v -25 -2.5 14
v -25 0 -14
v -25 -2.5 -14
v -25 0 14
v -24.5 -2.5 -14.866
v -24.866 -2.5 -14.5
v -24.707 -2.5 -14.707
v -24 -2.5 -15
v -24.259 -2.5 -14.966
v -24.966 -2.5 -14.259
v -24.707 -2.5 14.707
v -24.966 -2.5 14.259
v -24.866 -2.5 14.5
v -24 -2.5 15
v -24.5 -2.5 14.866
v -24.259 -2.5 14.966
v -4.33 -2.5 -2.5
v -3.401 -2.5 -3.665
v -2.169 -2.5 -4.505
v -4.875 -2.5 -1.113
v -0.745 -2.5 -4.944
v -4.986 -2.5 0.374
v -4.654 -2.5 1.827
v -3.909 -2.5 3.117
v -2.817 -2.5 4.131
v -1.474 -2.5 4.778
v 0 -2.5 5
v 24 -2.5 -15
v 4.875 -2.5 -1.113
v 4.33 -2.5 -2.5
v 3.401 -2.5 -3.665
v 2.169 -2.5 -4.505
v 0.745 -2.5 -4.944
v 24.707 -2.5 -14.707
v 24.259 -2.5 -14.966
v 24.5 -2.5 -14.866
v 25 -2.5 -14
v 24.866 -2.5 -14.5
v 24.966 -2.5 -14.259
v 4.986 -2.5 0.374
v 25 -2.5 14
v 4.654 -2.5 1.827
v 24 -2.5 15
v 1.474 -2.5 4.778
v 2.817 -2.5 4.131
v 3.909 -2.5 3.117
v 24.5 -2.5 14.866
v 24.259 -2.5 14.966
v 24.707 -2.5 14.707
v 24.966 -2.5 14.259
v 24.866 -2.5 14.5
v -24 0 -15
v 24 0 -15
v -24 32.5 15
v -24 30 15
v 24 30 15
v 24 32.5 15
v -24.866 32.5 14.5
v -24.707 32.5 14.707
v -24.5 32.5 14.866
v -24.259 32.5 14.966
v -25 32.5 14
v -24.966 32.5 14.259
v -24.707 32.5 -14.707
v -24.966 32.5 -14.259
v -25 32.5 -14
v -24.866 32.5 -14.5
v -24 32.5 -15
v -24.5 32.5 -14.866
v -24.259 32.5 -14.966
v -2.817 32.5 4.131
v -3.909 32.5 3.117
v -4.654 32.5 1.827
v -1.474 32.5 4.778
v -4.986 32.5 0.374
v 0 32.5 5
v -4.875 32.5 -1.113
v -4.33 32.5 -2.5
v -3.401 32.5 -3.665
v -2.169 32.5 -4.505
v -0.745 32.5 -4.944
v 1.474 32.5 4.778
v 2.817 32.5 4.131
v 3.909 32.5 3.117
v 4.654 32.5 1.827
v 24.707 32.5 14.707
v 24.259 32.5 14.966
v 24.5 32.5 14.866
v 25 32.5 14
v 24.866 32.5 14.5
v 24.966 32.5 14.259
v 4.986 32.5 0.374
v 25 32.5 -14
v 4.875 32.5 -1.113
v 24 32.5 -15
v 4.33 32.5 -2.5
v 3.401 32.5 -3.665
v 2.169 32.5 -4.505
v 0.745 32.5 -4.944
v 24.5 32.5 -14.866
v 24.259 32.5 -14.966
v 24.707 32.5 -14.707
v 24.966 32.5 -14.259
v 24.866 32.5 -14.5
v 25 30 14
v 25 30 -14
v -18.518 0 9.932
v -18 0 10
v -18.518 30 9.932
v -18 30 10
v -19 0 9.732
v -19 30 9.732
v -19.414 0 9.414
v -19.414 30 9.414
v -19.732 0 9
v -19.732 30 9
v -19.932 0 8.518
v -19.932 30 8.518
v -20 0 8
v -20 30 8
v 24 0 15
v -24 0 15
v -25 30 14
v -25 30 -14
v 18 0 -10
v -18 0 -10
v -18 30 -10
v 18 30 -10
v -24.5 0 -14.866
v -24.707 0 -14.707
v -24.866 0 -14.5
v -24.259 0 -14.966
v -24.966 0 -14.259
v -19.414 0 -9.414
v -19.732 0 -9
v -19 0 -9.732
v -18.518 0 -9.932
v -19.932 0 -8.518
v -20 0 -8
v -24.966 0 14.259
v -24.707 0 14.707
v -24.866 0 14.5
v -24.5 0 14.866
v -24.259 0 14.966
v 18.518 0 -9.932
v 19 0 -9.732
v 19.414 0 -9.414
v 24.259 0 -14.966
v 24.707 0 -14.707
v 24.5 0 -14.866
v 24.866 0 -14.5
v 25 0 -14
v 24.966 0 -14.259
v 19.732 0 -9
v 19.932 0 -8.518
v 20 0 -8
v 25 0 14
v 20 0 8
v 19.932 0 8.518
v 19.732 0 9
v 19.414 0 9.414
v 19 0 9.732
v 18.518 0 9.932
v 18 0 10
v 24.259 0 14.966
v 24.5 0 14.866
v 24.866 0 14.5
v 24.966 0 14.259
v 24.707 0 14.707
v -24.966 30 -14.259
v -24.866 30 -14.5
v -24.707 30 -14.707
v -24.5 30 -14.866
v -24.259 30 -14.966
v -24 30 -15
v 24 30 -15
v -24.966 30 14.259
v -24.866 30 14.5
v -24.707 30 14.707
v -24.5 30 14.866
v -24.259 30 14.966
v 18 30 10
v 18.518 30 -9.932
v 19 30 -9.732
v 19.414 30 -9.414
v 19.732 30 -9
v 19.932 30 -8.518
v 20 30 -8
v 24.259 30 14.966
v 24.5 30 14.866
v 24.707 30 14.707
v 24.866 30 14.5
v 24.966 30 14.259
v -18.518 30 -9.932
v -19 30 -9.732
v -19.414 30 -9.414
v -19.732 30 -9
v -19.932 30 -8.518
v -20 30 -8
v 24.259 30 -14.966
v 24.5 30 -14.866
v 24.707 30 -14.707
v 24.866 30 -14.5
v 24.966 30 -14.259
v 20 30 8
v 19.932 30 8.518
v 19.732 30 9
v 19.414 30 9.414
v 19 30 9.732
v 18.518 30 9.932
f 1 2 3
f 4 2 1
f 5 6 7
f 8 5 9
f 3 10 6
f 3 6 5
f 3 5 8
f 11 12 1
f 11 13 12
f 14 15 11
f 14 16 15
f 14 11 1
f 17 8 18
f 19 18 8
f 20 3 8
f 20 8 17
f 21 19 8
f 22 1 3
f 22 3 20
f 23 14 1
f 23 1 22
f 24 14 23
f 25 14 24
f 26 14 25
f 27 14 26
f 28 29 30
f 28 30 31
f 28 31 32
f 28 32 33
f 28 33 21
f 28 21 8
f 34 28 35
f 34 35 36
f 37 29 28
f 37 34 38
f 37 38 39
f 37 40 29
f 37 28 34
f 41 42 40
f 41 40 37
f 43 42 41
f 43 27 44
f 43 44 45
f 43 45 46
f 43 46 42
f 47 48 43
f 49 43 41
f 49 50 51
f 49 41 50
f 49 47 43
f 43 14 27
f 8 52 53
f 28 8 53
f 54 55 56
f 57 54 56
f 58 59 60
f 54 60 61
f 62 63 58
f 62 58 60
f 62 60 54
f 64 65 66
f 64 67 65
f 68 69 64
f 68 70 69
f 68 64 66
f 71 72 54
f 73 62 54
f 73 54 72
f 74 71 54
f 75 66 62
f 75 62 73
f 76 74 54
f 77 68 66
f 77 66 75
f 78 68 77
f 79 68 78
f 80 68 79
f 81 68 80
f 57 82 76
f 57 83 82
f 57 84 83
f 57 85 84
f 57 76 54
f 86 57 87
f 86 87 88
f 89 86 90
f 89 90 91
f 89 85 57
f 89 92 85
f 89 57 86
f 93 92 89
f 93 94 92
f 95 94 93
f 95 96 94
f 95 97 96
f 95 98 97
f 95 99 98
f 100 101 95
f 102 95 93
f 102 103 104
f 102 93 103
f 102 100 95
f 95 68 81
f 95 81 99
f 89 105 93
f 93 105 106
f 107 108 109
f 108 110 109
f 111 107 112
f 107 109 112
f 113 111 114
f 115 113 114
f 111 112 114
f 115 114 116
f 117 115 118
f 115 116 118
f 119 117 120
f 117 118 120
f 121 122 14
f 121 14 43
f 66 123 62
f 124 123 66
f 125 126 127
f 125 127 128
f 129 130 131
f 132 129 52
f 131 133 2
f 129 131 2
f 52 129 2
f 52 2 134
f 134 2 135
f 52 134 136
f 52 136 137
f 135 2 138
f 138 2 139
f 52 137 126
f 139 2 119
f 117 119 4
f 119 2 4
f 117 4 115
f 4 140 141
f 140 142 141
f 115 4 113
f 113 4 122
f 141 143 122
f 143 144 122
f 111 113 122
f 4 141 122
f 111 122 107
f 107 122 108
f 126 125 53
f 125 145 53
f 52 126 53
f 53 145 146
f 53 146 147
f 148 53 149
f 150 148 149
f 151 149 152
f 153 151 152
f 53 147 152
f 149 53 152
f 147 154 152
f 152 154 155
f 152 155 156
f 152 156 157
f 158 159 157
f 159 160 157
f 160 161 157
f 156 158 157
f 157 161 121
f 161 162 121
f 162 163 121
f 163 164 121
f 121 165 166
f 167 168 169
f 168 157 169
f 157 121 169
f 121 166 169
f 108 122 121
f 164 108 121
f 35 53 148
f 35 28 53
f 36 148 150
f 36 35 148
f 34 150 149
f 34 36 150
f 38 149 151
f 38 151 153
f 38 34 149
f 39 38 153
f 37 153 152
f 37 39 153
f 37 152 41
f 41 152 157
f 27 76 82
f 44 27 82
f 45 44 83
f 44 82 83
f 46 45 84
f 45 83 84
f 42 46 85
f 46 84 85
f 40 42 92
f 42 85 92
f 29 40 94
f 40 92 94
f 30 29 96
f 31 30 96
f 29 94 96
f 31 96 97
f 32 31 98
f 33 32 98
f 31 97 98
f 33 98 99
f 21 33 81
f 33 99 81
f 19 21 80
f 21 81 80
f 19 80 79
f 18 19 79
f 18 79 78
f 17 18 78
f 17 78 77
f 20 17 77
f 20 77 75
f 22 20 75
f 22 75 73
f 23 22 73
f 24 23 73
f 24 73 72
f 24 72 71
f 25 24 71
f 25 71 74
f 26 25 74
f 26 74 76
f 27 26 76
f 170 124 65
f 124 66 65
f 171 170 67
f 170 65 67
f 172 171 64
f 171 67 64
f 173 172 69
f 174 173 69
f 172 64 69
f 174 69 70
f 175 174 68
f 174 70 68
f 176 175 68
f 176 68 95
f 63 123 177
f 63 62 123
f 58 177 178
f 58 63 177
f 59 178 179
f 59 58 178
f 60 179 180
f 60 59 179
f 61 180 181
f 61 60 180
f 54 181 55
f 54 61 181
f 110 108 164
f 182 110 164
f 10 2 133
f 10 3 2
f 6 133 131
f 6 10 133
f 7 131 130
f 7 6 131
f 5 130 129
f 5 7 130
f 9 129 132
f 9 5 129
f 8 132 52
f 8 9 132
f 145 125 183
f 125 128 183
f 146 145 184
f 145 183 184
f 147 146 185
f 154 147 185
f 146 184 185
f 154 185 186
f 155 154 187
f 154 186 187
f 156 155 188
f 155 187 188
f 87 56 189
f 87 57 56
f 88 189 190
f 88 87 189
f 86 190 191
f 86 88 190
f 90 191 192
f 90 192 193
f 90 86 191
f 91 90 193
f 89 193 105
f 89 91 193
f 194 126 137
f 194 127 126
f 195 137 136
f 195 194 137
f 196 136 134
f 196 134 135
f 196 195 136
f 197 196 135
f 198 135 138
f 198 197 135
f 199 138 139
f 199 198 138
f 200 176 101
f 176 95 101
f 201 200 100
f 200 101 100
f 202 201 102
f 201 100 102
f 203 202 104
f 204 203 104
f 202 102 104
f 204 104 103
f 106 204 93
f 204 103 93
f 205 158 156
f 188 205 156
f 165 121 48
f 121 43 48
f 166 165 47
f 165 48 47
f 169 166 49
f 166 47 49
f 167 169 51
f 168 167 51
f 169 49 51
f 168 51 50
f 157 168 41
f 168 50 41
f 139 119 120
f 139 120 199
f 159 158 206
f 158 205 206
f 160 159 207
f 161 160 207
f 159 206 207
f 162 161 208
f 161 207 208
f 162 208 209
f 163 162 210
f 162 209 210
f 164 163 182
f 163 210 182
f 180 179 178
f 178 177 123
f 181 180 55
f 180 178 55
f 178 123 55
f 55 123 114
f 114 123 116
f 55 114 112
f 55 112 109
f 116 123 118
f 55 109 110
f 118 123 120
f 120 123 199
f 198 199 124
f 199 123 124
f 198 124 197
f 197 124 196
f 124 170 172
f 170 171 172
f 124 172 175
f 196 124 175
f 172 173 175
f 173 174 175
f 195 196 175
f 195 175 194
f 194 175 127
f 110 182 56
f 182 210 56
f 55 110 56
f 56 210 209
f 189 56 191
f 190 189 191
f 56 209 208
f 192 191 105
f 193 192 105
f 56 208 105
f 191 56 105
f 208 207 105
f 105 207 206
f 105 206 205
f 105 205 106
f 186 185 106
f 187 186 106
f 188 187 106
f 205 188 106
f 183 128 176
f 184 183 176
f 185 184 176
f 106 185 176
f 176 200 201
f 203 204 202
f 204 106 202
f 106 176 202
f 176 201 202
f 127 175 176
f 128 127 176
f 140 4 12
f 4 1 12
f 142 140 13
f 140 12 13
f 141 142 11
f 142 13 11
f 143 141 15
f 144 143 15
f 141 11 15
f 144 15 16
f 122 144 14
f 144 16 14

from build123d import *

# Parameters (mm, degrees)
SKETCH1_W          = 40
SKETCH1_H          = 20
MAIN_BODY_DEPTH    = 30
SKETCH2_W          = 50
SKETCH2_H          = 30
FLANGE_1_DEPTH     = 2.5
SKETCH4_W          = 50
SKETCH4_H          = 30
SKETCH4_W_2        = 40
SKETCH4_H_2        = 20
FLANGE_2_DEPTH     = 2.5
SKETCH5_R          = 5
HOLE_DEPTH         = 46.552167896
MAIN_BODY_FILLET_R = 2
FLANGE_FILLET_R    = 1


with BuildPart() as part:
    # Sketch1 → Main Body (new body)
    with BuildSketch(Plane(origin=(0, 0, 0), x_dir=(1, 0, 0), z_dir=(0, 1, 0))):
        Rectangle(SKETCH1_W, SKETCH1_H)
    extrude(amount=MAIN_BODY_DEPTH)

    # Sketch2 → Flange 1 (add)
    with BuildSketch(Plane(origin=(0, 30, 0), x_dir=(1, 0, 0), z_dir=(0, 1, 0))):
        Rectangle(SKETCH2_W, SKETCH2_H)
    extrude(amount=FLANGE_1_DEPTH)

    # Sketch4 → Flange 2 (add)
    # profile 1 of 2: a face of its own
    with BuildSketch(Plane.XZ):
        Rectangle(SKETCH4_W, SKETCH4_H)
        Rectangle(SKETCH4_W_2, SKETCH4_H_2, mode=Mode.SUBTRACT)
    # profile 2 of 2: a face of its own
    with BuildSketch(Plane.XZ):
        Rectangle(SKETCH4_W_2, SKETCH4_H_2)
    extrude(amount=FLANGE_2_DEPTH)

    # Sketch5 → Hole (cut, through all)
    with BuildSketch(Plane(origin=(0, 32.5, 0), x_dir=(1, 0, 0), z_dir=(0, 1, 0))):
        with Locations(Location((0, 0, 0), (0, 0, 270))):
            Circle(SKETCH5_R)
    extrude(amount=-HOLE_DEPTH, mode=Mode.SUBTRACT)

    # Main Body Fillet
    main_body_fillet_edges = [part.edges().sort_by_distance(p)[0] for p in [
        (20, 15, 10),
        (-20, 15, 10),
        (-20, 15, -10),
        (20, 15, -10),
    ]]
    fillet(main_body_fillet_edges, radius=MAIN_BODY_FILLET_R)

    # Flange Fillet
    flange_fillet_edges = [part.edges().sort_by_distance(p)[0] for p in [
        (25, 31.25, 15),
        (25, 31.25, -15),
        (-25, 31.25, -15),
        (-25, 31.25, 15),
        (25, -1.25, 15),
        (-25, -1.25, 15),
        (-25, -1.25, -15),
        (25, -1.25, -15),
    ]]
    fillet(flange_fillet_edges, radius=FLANGE_FILLET_R)


solid = part.part
